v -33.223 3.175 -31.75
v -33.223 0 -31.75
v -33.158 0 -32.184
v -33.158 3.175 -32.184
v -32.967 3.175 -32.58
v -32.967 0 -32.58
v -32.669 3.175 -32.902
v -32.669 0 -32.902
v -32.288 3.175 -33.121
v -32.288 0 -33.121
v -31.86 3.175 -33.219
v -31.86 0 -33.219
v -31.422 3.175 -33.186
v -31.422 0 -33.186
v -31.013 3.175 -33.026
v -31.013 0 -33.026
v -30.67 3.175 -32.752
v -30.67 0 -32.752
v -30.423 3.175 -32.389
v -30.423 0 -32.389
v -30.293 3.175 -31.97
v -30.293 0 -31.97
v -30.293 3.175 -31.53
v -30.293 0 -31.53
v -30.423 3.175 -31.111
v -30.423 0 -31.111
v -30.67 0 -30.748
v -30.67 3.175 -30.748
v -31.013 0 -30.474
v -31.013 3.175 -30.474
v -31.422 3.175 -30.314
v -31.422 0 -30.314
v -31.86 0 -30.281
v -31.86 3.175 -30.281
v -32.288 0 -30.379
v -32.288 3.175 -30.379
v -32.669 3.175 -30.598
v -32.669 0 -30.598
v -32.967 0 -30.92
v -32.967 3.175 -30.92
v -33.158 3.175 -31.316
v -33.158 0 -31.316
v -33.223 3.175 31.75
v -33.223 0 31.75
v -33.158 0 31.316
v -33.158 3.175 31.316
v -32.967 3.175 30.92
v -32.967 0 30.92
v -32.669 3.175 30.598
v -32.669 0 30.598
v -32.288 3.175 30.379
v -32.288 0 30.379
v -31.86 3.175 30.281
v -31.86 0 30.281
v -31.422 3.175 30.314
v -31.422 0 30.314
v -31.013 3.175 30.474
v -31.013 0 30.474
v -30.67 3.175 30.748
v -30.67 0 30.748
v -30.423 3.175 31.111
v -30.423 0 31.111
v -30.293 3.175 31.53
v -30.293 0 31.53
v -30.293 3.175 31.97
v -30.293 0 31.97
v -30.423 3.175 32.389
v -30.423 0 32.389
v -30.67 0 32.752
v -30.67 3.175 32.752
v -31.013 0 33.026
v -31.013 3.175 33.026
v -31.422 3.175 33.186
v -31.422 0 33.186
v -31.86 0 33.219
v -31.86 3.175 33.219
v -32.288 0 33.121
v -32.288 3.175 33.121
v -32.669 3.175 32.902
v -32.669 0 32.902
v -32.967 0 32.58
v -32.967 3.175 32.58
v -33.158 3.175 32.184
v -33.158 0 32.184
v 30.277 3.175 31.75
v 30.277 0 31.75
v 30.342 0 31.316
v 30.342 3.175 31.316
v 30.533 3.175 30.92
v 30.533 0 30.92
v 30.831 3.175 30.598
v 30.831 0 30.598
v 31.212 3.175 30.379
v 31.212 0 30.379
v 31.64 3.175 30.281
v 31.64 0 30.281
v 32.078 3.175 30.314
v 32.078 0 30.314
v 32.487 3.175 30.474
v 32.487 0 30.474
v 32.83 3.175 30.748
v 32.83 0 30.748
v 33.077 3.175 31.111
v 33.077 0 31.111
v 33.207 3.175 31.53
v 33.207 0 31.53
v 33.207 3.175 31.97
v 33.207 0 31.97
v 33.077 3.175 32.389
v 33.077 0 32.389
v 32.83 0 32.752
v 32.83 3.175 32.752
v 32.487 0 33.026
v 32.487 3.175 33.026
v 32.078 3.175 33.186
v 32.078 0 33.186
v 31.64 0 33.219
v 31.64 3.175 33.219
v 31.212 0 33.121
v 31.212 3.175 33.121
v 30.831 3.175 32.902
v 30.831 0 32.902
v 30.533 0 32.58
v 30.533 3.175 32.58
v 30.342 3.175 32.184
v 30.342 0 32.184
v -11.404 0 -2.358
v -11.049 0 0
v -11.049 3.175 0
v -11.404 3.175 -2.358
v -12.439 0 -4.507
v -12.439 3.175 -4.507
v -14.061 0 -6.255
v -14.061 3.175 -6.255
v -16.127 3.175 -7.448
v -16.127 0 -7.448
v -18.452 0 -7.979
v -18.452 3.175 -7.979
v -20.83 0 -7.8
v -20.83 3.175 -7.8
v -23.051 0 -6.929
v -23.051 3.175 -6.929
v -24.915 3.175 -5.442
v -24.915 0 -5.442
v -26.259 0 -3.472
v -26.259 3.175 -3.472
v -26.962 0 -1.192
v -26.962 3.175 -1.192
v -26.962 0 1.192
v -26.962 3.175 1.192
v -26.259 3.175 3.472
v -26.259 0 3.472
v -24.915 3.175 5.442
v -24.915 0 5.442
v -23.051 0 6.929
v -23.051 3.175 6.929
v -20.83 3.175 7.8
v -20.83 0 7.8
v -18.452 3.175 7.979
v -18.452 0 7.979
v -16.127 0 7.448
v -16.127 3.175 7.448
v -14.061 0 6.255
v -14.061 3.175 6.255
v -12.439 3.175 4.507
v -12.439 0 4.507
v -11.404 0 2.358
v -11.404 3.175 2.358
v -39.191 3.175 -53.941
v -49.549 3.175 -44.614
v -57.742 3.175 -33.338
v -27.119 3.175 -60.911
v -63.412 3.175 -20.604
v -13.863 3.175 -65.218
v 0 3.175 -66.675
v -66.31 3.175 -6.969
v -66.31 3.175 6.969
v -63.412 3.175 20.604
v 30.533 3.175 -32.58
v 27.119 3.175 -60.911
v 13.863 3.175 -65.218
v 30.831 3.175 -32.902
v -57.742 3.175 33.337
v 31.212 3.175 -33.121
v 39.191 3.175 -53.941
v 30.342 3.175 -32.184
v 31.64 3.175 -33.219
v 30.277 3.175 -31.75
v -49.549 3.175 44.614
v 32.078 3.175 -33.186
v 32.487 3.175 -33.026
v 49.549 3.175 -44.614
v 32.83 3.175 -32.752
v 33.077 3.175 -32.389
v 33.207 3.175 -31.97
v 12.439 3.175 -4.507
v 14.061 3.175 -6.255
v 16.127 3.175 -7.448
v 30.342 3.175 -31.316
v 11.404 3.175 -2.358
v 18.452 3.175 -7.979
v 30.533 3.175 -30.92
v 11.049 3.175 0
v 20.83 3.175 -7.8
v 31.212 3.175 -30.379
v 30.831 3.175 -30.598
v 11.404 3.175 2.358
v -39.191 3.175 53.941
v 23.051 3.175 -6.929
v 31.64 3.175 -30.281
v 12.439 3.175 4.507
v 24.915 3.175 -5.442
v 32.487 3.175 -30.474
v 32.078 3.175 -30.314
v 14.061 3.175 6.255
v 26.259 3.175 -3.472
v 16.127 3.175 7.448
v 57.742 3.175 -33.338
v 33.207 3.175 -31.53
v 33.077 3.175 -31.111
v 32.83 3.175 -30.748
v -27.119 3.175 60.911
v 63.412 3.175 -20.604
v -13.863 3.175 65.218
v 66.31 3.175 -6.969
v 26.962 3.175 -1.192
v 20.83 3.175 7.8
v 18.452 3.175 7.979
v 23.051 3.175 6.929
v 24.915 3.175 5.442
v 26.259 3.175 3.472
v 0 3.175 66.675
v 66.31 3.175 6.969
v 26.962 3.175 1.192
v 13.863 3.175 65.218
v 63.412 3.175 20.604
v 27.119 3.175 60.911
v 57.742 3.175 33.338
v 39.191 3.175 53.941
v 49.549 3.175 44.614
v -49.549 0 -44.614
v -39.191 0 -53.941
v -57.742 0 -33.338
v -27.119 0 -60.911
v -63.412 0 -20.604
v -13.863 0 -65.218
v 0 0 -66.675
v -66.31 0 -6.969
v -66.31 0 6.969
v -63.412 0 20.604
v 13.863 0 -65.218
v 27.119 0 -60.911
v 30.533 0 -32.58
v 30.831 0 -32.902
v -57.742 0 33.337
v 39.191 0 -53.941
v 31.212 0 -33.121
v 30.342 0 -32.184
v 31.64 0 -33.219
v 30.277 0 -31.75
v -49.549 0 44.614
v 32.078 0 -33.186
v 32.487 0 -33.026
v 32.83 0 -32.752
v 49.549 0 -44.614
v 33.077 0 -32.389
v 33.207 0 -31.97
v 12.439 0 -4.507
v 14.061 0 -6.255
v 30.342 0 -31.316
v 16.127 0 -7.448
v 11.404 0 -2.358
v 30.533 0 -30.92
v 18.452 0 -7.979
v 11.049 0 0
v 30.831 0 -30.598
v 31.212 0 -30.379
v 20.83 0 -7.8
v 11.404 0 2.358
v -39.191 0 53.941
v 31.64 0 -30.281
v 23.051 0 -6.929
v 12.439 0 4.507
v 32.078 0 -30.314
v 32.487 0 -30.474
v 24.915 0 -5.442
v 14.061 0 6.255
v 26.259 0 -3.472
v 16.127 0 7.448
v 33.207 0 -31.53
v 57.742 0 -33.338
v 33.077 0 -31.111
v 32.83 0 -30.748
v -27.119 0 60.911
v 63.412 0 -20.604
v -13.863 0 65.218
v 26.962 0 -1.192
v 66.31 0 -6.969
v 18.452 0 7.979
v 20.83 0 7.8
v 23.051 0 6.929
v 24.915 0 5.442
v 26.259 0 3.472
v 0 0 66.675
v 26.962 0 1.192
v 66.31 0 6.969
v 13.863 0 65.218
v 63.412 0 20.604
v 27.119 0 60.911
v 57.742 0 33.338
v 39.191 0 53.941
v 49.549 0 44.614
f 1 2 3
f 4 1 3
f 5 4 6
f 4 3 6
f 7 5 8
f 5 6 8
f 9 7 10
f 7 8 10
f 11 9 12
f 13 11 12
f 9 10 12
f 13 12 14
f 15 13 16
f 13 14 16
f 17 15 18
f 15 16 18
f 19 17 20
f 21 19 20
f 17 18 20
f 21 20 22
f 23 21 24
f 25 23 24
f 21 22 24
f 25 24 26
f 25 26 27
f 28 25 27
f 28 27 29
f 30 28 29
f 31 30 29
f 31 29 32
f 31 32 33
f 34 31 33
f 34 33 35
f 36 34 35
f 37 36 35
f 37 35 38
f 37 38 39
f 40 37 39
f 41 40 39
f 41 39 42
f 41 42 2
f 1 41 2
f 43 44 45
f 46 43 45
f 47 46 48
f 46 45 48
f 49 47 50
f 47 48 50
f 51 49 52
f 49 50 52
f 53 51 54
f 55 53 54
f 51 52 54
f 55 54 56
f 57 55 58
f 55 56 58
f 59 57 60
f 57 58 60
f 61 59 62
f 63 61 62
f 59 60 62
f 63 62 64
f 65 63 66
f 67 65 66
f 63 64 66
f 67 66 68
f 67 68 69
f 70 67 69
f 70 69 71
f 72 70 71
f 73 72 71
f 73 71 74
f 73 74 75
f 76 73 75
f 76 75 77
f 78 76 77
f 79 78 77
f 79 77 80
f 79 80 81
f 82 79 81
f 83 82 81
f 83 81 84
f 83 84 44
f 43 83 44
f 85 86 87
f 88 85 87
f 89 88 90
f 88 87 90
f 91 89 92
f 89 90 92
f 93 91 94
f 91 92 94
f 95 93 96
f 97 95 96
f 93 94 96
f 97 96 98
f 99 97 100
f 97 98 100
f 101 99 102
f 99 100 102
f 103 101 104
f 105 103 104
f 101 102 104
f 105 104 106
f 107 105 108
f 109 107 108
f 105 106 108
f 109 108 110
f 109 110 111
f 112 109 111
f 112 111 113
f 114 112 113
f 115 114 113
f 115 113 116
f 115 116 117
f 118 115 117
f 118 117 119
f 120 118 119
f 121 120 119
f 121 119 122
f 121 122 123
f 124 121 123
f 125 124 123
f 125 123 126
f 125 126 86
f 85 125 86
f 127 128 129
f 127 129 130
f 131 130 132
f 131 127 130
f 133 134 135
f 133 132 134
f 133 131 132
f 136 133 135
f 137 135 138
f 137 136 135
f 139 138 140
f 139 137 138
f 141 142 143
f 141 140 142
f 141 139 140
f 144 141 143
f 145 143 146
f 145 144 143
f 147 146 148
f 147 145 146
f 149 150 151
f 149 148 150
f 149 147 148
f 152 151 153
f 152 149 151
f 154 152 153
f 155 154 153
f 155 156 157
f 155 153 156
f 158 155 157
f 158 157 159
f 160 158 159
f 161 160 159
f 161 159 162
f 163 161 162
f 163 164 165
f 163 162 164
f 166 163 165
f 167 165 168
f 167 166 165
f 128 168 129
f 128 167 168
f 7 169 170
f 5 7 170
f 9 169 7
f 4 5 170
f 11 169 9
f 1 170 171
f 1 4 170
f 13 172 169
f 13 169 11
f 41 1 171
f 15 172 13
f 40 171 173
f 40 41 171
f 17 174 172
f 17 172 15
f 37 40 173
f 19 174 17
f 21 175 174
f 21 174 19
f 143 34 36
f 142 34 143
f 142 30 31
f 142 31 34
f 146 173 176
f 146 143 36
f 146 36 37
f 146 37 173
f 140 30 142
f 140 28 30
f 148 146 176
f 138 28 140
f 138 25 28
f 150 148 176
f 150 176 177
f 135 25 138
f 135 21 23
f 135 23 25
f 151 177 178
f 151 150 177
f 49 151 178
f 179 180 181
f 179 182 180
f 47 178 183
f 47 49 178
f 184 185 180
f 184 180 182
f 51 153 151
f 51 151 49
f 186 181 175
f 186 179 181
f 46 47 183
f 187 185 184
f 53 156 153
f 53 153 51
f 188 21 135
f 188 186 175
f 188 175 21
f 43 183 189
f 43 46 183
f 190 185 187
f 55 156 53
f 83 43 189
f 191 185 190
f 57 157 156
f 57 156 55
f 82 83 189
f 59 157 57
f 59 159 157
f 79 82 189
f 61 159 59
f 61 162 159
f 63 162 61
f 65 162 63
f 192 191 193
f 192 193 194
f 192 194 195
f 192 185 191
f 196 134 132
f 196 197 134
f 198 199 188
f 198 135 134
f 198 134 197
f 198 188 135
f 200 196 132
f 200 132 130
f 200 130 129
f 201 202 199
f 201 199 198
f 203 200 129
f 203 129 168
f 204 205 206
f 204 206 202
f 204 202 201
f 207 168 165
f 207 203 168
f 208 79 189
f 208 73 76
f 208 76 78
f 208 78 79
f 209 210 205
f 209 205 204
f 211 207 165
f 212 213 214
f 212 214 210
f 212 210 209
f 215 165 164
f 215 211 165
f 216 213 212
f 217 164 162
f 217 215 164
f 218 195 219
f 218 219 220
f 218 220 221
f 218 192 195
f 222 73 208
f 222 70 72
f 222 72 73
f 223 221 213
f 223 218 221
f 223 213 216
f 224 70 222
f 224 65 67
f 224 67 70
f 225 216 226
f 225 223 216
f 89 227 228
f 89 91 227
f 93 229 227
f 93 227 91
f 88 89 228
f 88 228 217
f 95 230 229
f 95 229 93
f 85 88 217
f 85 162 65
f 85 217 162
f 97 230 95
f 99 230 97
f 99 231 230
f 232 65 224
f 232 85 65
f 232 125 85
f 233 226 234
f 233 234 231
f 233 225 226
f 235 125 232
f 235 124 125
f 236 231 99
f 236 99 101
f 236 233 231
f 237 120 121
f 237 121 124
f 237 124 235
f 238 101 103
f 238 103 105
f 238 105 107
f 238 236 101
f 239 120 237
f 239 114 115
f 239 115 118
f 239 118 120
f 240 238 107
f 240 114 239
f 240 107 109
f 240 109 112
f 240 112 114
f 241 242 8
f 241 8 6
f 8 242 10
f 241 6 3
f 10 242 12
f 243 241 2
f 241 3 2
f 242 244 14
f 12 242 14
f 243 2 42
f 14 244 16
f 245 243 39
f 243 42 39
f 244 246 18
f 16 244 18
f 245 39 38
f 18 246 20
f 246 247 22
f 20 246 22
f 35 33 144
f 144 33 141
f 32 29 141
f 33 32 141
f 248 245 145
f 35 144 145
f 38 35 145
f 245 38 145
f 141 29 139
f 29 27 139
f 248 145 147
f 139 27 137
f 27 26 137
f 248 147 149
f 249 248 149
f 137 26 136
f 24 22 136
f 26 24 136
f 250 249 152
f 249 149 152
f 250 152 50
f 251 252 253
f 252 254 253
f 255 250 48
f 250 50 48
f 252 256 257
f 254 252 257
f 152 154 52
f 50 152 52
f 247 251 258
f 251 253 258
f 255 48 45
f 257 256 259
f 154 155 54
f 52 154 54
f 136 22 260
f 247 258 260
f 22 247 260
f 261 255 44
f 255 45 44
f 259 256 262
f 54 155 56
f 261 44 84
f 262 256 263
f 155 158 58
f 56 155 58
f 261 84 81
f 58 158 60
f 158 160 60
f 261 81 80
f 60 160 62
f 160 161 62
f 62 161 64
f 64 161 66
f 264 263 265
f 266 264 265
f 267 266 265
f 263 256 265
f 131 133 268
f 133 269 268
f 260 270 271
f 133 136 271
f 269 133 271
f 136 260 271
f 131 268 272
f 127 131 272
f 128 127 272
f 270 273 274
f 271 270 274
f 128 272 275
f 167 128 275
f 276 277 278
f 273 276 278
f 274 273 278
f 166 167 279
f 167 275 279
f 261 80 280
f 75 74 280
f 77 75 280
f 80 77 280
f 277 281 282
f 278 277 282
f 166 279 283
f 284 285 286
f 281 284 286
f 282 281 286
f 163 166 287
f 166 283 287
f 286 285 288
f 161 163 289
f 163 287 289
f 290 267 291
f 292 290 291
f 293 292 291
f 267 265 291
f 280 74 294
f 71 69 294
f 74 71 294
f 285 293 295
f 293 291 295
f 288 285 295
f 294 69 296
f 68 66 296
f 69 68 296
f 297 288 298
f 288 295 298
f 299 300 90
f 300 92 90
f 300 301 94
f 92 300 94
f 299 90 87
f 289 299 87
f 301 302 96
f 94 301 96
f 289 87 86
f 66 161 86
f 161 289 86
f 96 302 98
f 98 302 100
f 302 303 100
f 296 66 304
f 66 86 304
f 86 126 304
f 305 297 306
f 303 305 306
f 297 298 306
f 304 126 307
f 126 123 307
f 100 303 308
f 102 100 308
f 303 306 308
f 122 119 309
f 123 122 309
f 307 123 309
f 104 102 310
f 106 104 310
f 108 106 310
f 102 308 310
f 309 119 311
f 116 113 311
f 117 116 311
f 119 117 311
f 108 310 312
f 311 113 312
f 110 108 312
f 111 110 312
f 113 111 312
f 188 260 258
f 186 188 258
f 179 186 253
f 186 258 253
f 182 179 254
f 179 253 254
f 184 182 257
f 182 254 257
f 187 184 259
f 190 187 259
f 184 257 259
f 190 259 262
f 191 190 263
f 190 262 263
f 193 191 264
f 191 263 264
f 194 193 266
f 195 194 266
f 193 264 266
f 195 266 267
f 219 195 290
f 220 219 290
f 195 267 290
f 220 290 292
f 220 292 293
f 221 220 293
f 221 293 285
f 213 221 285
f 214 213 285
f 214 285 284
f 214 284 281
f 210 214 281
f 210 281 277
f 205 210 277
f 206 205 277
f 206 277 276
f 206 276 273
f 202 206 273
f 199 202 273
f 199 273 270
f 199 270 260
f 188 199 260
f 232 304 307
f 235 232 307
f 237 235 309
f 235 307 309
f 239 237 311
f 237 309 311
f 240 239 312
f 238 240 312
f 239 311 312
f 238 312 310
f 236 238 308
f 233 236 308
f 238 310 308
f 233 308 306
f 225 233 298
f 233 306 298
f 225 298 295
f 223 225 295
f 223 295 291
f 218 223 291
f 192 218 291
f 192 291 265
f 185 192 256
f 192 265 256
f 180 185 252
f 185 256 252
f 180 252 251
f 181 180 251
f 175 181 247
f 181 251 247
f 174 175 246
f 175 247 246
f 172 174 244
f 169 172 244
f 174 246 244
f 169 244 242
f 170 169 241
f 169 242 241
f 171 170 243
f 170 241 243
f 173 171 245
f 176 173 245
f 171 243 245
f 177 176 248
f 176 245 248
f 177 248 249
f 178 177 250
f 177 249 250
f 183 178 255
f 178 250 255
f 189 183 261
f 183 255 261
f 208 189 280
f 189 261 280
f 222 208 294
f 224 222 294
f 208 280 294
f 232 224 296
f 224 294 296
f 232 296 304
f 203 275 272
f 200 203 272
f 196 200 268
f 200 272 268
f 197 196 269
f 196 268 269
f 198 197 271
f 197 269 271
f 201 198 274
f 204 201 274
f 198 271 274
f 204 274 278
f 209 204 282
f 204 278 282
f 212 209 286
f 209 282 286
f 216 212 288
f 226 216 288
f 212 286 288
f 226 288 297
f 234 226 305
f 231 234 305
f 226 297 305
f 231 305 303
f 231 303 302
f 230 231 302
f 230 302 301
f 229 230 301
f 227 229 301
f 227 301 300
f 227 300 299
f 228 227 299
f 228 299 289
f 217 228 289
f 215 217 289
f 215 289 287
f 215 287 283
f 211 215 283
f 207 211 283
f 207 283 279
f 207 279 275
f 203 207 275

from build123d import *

# Parameters (mm, degrees)
SKETCH1_R             = 66.675
BOSS_EXTRUDE1_DEPTH   = 3.175
HOLE1_D               = 16.002
F_4_CLEARANCE_HOLE1_D = 2.9464
LPATTERN1_COUNT       = 2
LPATTERN1_PITCH       = 63.5
LPATTERN1_COUNT_DIR2  = 2
LPATTERN1_PITCH_DIR2  = 63.5


with BuildPart() as part:
    # Sketch1 → Boss-Extrude1 (new body)
    with BuildSketch(Plane(origin=(0, 0, 0), x_dir=(1, 0, 0), z_dir=(0, 1, 0))):
        with Locations(Location((0, 0, 0), (0, 0, 270))):
            Circle(SKETCH1_R)
    extrude(amount=BOSS_EXTRUDE1_DEPTH)

    # Hole1 (through all)
    with Locations(Plane(origin=(0, 3.175, 0), x_dir=(1, 0, 0), z_dir=(0, 1, 0))):
        with Locations((19.05, 0)):
            hole1 = Hole(HOLE1_D / 2)

    # Mirror1: Hole1 across plane
    add(hole1.mirror(Plane(origin=(0, 0, 0), x_dir=(0, 0, 1), z_dir=(1, 0, 0))), mode=Mode.SUBTRACT)

    # #4 Clearance Hole1 (through all)
    with Locations(Plane(origin=(0, 3.175, 0), x_dir=(1, 0, 0), z_dir=(0, 1, 0))):
        with Locations((-31.75, 31.75)):
            f_4_clearance_hole1 = Hole(F_4_CLEARANCE_HOLE1_D / 2)

    # LPattern1: 4 Clearance Hole1 2 × 2
    with Locations(*[(i * LPATTERN1_PITCH, 0, j * LPATTERN1_PITCH_DIR2) for i in range(LPATTERN1_COUNT) for j in range(LPATTERN1_COUNT_DIR2) if (i, j) != (0, 0)]):
        add(f_4_clearance_hole1, mode=Mode.SUBTRACT)


solid = part.part
